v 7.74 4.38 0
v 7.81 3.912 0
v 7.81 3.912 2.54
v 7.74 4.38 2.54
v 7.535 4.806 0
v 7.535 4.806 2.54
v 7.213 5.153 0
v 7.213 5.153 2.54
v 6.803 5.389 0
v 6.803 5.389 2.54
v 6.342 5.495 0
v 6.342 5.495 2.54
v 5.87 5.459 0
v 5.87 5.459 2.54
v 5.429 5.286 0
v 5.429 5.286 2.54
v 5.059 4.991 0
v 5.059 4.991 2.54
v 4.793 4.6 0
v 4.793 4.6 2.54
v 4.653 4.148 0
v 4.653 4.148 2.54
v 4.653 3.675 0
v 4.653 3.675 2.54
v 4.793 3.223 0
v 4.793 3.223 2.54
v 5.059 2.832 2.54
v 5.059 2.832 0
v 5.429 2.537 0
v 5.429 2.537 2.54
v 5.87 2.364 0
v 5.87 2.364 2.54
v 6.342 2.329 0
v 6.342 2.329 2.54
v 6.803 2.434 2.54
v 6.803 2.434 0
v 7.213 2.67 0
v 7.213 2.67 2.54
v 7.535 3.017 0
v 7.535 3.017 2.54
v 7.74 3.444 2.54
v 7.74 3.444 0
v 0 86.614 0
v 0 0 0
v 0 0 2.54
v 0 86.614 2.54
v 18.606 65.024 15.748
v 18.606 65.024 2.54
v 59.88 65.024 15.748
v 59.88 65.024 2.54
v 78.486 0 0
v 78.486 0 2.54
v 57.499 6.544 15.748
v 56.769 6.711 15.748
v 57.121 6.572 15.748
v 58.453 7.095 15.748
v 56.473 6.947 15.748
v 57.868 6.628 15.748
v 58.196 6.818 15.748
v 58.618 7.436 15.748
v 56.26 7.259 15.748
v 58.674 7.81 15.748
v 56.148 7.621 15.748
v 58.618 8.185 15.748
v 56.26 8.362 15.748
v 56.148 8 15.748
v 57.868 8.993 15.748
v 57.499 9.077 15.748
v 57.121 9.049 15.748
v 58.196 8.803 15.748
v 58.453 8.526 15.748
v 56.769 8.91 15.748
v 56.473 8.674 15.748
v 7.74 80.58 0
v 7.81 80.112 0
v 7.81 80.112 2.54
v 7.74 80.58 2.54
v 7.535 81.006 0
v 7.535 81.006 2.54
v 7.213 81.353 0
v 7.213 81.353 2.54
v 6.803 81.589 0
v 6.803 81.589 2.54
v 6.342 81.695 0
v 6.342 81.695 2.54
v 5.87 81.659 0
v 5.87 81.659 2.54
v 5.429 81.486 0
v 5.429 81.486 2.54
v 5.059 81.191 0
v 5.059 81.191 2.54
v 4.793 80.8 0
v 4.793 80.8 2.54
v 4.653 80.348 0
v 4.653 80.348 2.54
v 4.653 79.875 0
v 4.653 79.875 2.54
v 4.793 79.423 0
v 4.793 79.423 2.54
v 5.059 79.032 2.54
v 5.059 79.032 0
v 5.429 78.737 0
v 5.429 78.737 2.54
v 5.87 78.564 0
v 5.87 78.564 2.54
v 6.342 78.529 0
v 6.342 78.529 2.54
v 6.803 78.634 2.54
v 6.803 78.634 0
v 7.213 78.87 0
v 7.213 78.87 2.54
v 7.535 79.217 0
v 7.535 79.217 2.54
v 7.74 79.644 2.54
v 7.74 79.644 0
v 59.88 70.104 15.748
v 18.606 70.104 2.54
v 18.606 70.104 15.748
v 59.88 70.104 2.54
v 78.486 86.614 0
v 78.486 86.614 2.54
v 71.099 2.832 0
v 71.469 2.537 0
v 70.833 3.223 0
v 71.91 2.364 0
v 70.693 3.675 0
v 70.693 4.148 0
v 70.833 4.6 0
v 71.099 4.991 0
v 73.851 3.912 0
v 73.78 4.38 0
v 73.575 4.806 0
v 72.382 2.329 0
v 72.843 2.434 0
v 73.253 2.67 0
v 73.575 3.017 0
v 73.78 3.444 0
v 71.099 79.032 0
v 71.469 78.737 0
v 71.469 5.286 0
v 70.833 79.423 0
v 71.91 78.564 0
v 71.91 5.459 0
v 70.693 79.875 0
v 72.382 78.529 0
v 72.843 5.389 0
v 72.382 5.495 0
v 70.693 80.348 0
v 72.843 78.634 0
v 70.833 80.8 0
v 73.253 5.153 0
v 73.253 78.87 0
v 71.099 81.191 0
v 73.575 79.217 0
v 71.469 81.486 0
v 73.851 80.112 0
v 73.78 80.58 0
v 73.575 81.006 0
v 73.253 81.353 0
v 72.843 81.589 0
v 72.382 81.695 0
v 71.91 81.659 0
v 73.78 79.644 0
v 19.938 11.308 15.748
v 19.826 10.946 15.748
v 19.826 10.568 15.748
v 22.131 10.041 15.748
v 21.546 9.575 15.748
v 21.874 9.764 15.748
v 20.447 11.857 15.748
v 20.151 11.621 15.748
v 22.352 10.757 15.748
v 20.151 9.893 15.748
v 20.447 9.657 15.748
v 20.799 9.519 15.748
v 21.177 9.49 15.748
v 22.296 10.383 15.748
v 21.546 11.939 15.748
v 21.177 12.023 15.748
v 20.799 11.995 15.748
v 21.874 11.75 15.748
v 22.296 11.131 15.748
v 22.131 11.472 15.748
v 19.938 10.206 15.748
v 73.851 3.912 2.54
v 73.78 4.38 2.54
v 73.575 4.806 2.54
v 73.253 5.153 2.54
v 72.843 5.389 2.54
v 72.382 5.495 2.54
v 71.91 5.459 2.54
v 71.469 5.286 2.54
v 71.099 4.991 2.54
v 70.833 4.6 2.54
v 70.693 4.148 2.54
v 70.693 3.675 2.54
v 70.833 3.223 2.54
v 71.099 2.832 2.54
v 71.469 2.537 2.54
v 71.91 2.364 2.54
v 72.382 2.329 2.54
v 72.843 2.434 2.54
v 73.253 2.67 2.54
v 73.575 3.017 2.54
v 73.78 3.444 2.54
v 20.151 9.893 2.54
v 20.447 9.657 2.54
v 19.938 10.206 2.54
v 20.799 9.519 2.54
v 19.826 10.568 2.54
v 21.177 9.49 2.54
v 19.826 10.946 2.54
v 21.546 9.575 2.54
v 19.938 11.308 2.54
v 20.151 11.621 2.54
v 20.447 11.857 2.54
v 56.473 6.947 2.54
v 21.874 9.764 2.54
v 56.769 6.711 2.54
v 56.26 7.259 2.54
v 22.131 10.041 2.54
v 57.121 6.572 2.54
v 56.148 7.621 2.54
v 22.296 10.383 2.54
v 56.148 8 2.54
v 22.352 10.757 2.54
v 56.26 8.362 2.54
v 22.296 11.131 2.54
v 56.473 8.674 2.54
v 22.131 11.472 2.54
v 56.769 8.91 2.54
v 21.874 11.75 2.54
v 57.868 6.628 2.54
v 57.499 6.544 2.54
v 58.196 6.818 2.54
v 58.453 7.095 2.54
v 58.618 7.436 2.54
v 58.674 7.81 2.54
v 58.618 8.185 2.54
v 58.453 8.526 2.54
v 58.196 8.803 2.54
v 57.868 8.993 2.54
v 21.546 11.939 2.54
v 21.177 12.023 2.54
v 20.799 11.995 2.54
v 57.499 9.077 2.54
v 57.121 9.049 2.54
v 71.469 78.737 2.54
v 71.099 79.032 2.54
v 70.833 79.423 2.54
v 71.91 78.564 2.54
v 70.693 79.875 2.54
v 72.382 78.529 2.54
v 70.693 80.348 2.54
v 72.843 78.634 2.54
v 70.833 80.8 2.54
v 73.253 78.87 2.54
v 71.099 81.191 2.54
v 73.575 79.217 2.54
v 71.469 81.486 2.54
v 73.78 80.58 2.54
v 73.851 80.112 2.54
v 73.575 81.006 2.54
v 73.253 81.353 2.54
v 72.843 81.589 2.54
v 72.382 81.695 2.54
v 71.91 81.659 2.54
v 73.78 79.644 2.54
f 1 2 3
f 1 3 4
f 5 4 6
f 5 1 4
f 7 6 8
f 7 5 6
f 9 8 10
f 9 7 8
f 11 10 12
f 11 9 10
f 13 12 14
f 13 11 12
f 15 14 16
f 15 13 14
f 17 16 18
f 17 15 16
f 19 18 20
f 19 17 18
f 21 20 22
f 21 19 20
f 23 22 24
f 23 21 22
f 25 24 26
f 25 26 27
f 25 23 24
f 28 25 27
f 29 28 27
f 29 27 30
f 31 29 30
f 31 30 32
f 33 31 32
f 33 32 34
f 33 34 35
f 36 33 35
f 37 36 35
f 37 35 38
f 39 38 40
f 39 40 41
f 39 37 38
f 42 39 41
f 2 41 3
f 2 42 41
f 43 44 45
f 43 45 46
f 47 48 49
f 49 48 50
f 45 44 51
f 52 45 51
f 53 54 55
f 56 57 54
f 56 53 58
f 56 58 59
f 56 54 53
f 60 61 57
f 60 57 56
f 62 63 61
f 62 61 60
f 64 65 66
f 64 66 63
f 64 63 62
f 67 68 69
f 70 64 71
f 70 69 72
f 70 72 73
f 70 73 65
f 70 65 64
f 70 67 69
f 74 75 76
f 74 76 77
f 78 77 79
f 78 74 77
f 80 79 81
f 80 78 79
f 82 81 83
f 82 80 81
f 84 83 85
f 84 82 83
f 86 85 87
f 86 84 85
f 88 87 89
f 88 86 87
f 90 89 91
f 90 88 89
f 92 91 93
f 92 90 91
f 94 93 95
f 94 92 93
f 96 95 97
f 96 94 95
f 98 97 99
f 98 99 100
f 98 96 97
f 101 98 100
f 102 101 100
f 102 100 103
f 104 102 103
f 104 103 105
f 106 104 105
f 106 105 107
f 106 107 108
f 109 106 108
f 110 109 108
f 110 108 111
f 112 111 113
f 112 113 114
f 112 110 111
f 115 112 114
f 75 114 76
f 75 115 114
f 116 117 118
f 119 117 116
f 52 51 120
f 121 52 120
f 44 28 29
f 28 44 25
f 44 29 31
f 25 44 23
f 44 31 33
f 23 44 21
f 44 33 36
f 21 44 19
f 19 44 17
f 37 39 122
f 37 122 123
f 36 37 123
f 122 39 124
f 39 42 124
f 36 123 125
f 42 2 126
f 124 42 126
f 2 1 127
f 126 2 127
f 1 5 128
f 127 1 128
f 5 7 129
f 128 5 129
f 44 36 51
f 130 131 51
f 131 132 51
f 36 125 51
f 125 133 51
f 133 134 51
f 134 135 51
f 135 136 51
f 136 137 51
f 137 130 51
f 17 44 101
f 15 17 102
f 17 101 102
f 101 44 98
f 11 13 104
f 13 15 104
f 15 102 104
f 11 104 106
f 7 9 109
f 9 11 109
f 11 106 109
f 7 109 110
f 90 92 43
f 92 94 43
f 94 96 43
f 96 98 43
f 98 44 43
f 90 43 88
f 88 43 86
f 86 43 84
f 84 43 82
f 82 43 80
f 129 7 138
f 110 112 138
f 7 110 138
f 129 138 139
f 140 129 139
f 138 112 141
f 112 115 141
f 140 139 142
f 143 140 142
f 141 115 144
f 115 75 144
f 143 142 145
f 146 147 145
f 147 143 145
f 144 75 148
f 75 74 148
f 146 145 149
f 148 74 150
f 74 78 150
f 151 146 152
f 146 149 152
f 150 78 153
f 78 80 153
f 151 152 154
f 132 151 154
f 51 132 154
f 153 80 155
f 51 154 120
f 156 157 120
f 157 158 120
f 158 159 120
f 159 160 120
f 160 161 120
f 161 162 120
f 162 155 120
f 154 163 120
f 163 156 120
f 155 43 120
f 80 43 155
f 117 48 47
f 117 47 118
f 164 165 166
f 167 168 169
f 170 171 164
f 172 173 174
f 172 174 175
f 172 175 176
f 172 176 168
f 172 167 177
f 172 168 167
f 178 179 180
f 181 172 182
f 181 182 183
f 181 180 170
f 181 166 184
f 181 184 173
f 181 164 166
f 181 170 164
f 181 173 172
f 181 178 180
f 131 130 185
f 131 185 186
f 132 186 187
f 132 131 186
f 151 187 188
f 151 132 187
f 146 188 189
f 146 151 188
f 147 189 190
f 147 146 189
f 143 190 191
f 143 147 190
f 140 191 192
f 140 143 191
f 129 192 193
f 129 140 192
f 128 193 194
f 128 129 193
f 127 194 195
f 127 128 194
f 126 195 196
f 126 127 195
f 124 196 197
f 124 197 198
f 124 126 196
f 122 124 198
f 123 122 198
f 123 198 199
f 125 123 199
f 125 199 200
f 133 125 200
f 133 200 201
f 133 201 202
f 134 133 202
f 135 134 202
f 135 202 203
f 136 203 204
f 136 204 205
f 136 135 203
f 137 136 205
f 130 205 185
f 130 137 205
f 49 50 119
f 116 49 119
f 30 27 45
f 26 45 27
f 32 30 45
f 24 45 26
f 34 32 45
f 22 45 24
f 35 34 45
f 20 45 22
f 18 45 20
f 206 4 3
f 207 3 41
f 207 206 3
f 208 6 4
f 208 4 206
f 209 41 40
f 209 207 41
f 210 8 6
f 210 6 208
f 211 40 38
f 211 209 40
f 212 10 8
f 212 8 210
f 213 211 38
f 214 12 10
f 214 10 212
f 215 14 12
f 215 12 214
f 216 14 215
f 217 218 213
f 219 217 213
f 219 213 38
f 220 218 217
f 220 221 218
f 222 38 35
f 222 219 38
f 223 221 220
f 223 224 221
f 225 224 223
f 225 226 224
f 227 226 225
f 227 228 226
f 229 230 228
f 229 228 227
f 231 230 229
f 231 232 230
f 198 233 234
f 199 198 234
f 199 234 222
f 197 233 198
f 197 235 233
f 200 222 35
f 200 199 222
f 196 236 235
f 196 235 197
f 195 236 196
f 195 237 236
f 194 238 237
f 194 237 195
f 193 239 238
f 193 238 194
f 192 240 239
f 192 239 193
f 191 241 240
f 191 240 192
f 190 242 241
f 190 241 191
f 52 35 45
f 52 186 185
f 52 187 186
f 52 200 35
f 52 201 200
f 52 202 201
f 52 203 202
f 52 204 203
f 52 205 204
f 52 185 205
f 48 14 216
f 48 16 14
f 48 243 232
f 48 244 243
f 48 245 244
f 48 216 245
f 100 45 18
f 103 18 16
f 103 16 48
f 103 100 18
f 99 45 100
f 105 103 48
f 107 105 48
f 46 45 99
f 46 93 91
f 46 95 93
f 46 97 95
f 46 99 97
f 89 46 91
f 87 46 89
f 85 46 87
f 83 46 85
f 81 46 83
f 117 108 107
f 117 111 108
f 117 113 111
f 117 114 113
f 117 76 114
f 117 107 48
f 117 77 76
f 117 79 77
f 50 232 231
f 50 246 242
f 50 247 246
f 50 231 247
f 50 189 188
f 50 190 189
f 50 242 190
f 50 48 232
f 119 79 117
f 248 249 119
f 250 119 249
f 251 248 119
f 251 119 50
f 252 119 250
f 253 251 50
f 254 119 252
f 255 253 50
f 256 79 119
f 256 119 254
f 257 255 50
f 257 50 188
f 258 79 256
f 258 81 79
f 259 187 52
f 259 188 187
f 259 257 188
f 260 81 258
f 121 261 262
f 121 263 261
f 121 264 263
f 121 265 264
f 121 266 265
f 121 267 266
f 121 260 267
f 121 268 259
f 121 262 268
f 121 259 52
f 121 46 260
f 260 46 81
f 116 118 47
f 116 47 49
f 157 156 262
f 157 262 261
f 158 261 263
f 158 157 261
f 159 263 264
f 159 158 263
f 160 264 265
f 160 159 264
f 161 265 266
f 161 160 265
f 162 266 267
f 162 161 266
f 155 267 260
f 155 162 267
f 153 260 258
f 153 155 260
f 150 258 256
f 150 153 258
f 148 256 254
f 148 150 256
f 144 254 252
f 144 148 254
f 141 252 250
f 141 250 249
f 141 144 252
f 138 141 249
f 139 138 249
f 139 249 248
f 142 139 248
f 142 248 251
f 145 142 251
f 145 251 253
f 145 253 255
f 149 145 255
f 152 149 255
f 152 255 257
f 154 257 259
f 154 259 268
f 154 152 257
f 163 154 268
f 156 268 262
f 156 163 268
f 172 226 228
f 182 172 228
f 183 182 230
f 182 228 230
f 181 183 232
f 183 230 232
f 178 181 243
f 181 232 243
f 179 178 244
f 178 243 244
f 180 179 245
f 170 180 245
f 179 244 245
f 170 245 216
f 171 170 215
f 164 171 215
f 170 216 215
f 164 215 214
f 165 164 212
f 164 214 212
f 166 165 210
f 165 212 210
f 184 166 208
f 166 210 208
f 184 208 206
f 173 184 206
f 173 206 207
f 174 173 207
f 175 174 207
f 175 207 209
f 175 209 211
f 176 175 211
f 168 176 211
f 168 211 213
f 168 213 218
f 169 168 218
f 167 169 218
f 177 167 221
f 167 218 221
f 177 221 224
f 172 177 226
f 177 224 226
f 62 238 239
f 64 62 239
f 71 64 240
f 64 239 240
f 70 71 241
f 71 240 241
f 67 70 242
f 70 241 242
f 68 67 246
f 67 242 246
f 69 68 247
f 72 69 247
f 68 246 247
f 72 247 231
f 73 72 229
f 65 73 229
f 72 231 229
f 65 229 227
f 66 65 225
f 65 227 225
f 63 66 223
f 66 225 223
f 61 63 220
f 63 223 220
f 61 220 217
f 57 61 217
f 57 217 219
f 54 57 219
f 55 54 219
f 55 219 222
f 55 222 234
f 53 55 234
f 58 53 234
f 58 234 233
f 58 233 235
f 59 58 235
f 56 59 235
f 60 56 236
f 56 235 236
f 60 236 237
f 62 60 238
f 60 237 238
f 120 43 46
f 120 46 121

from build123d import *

# Parameters (mm, degrees)
SKETCH1_W           = 78.486
SKETCH1_H           = 86.614
SKETCH1_R           = 1.5875
BOSS_EXTRUDE1_DEPTH = 2.54
SKETCH2_R           = 1.27
SKETCH2_W           = 41.275
SKETCH2_H           = 5.08
BOSS_EXTRUDE2_DEPTH = 13.208


with BuildPart() as part:
    # Sketch1 → Boss-Extrude1 (new body)
    with BuildSketch(Plane.XY):
        with Locations((39.243, 43.307)):
            Rectangle(SKETCH1_W, SKETCH1_H)
        with Locations((6.223, 80.1116)):
            Circle(SKETCH1_R, mode=Mode.SUBTRACT)
        with Locations((72.263, 80.1116)):
            Circle(SKETCH1_R, mode=Mode.SUBTRACT)
        with Locations((72.263, 3.9116)):
            Circle(SKETCH1_R, mode=Mode.SUBTRACT)
        with Locations((6.223, 3.9116)):
            Circle(SKETCH1_R, mode=Mode.SUBTRACT)
    extrude(amount=BOSS_EXTRUDE1_DEPTH)

    # Sketch2 → Boss-Extrude2 (add)
    with BuildSketch(Plane.XY.offset(2.54)):
        with Locations((21.082, 10.7569)):
            Circle(SKETCH2_R)
        with Locations((57.404, 7.8105)):
            Circle(SKETCH2_R)
        with Locations((39.243, 67.564)):
            Rectangle(SKETCH2_W, SKETCH2_H)
    extrude(amount=BOSS_EXTRUDE2_DEPTH)


solid = part.part
